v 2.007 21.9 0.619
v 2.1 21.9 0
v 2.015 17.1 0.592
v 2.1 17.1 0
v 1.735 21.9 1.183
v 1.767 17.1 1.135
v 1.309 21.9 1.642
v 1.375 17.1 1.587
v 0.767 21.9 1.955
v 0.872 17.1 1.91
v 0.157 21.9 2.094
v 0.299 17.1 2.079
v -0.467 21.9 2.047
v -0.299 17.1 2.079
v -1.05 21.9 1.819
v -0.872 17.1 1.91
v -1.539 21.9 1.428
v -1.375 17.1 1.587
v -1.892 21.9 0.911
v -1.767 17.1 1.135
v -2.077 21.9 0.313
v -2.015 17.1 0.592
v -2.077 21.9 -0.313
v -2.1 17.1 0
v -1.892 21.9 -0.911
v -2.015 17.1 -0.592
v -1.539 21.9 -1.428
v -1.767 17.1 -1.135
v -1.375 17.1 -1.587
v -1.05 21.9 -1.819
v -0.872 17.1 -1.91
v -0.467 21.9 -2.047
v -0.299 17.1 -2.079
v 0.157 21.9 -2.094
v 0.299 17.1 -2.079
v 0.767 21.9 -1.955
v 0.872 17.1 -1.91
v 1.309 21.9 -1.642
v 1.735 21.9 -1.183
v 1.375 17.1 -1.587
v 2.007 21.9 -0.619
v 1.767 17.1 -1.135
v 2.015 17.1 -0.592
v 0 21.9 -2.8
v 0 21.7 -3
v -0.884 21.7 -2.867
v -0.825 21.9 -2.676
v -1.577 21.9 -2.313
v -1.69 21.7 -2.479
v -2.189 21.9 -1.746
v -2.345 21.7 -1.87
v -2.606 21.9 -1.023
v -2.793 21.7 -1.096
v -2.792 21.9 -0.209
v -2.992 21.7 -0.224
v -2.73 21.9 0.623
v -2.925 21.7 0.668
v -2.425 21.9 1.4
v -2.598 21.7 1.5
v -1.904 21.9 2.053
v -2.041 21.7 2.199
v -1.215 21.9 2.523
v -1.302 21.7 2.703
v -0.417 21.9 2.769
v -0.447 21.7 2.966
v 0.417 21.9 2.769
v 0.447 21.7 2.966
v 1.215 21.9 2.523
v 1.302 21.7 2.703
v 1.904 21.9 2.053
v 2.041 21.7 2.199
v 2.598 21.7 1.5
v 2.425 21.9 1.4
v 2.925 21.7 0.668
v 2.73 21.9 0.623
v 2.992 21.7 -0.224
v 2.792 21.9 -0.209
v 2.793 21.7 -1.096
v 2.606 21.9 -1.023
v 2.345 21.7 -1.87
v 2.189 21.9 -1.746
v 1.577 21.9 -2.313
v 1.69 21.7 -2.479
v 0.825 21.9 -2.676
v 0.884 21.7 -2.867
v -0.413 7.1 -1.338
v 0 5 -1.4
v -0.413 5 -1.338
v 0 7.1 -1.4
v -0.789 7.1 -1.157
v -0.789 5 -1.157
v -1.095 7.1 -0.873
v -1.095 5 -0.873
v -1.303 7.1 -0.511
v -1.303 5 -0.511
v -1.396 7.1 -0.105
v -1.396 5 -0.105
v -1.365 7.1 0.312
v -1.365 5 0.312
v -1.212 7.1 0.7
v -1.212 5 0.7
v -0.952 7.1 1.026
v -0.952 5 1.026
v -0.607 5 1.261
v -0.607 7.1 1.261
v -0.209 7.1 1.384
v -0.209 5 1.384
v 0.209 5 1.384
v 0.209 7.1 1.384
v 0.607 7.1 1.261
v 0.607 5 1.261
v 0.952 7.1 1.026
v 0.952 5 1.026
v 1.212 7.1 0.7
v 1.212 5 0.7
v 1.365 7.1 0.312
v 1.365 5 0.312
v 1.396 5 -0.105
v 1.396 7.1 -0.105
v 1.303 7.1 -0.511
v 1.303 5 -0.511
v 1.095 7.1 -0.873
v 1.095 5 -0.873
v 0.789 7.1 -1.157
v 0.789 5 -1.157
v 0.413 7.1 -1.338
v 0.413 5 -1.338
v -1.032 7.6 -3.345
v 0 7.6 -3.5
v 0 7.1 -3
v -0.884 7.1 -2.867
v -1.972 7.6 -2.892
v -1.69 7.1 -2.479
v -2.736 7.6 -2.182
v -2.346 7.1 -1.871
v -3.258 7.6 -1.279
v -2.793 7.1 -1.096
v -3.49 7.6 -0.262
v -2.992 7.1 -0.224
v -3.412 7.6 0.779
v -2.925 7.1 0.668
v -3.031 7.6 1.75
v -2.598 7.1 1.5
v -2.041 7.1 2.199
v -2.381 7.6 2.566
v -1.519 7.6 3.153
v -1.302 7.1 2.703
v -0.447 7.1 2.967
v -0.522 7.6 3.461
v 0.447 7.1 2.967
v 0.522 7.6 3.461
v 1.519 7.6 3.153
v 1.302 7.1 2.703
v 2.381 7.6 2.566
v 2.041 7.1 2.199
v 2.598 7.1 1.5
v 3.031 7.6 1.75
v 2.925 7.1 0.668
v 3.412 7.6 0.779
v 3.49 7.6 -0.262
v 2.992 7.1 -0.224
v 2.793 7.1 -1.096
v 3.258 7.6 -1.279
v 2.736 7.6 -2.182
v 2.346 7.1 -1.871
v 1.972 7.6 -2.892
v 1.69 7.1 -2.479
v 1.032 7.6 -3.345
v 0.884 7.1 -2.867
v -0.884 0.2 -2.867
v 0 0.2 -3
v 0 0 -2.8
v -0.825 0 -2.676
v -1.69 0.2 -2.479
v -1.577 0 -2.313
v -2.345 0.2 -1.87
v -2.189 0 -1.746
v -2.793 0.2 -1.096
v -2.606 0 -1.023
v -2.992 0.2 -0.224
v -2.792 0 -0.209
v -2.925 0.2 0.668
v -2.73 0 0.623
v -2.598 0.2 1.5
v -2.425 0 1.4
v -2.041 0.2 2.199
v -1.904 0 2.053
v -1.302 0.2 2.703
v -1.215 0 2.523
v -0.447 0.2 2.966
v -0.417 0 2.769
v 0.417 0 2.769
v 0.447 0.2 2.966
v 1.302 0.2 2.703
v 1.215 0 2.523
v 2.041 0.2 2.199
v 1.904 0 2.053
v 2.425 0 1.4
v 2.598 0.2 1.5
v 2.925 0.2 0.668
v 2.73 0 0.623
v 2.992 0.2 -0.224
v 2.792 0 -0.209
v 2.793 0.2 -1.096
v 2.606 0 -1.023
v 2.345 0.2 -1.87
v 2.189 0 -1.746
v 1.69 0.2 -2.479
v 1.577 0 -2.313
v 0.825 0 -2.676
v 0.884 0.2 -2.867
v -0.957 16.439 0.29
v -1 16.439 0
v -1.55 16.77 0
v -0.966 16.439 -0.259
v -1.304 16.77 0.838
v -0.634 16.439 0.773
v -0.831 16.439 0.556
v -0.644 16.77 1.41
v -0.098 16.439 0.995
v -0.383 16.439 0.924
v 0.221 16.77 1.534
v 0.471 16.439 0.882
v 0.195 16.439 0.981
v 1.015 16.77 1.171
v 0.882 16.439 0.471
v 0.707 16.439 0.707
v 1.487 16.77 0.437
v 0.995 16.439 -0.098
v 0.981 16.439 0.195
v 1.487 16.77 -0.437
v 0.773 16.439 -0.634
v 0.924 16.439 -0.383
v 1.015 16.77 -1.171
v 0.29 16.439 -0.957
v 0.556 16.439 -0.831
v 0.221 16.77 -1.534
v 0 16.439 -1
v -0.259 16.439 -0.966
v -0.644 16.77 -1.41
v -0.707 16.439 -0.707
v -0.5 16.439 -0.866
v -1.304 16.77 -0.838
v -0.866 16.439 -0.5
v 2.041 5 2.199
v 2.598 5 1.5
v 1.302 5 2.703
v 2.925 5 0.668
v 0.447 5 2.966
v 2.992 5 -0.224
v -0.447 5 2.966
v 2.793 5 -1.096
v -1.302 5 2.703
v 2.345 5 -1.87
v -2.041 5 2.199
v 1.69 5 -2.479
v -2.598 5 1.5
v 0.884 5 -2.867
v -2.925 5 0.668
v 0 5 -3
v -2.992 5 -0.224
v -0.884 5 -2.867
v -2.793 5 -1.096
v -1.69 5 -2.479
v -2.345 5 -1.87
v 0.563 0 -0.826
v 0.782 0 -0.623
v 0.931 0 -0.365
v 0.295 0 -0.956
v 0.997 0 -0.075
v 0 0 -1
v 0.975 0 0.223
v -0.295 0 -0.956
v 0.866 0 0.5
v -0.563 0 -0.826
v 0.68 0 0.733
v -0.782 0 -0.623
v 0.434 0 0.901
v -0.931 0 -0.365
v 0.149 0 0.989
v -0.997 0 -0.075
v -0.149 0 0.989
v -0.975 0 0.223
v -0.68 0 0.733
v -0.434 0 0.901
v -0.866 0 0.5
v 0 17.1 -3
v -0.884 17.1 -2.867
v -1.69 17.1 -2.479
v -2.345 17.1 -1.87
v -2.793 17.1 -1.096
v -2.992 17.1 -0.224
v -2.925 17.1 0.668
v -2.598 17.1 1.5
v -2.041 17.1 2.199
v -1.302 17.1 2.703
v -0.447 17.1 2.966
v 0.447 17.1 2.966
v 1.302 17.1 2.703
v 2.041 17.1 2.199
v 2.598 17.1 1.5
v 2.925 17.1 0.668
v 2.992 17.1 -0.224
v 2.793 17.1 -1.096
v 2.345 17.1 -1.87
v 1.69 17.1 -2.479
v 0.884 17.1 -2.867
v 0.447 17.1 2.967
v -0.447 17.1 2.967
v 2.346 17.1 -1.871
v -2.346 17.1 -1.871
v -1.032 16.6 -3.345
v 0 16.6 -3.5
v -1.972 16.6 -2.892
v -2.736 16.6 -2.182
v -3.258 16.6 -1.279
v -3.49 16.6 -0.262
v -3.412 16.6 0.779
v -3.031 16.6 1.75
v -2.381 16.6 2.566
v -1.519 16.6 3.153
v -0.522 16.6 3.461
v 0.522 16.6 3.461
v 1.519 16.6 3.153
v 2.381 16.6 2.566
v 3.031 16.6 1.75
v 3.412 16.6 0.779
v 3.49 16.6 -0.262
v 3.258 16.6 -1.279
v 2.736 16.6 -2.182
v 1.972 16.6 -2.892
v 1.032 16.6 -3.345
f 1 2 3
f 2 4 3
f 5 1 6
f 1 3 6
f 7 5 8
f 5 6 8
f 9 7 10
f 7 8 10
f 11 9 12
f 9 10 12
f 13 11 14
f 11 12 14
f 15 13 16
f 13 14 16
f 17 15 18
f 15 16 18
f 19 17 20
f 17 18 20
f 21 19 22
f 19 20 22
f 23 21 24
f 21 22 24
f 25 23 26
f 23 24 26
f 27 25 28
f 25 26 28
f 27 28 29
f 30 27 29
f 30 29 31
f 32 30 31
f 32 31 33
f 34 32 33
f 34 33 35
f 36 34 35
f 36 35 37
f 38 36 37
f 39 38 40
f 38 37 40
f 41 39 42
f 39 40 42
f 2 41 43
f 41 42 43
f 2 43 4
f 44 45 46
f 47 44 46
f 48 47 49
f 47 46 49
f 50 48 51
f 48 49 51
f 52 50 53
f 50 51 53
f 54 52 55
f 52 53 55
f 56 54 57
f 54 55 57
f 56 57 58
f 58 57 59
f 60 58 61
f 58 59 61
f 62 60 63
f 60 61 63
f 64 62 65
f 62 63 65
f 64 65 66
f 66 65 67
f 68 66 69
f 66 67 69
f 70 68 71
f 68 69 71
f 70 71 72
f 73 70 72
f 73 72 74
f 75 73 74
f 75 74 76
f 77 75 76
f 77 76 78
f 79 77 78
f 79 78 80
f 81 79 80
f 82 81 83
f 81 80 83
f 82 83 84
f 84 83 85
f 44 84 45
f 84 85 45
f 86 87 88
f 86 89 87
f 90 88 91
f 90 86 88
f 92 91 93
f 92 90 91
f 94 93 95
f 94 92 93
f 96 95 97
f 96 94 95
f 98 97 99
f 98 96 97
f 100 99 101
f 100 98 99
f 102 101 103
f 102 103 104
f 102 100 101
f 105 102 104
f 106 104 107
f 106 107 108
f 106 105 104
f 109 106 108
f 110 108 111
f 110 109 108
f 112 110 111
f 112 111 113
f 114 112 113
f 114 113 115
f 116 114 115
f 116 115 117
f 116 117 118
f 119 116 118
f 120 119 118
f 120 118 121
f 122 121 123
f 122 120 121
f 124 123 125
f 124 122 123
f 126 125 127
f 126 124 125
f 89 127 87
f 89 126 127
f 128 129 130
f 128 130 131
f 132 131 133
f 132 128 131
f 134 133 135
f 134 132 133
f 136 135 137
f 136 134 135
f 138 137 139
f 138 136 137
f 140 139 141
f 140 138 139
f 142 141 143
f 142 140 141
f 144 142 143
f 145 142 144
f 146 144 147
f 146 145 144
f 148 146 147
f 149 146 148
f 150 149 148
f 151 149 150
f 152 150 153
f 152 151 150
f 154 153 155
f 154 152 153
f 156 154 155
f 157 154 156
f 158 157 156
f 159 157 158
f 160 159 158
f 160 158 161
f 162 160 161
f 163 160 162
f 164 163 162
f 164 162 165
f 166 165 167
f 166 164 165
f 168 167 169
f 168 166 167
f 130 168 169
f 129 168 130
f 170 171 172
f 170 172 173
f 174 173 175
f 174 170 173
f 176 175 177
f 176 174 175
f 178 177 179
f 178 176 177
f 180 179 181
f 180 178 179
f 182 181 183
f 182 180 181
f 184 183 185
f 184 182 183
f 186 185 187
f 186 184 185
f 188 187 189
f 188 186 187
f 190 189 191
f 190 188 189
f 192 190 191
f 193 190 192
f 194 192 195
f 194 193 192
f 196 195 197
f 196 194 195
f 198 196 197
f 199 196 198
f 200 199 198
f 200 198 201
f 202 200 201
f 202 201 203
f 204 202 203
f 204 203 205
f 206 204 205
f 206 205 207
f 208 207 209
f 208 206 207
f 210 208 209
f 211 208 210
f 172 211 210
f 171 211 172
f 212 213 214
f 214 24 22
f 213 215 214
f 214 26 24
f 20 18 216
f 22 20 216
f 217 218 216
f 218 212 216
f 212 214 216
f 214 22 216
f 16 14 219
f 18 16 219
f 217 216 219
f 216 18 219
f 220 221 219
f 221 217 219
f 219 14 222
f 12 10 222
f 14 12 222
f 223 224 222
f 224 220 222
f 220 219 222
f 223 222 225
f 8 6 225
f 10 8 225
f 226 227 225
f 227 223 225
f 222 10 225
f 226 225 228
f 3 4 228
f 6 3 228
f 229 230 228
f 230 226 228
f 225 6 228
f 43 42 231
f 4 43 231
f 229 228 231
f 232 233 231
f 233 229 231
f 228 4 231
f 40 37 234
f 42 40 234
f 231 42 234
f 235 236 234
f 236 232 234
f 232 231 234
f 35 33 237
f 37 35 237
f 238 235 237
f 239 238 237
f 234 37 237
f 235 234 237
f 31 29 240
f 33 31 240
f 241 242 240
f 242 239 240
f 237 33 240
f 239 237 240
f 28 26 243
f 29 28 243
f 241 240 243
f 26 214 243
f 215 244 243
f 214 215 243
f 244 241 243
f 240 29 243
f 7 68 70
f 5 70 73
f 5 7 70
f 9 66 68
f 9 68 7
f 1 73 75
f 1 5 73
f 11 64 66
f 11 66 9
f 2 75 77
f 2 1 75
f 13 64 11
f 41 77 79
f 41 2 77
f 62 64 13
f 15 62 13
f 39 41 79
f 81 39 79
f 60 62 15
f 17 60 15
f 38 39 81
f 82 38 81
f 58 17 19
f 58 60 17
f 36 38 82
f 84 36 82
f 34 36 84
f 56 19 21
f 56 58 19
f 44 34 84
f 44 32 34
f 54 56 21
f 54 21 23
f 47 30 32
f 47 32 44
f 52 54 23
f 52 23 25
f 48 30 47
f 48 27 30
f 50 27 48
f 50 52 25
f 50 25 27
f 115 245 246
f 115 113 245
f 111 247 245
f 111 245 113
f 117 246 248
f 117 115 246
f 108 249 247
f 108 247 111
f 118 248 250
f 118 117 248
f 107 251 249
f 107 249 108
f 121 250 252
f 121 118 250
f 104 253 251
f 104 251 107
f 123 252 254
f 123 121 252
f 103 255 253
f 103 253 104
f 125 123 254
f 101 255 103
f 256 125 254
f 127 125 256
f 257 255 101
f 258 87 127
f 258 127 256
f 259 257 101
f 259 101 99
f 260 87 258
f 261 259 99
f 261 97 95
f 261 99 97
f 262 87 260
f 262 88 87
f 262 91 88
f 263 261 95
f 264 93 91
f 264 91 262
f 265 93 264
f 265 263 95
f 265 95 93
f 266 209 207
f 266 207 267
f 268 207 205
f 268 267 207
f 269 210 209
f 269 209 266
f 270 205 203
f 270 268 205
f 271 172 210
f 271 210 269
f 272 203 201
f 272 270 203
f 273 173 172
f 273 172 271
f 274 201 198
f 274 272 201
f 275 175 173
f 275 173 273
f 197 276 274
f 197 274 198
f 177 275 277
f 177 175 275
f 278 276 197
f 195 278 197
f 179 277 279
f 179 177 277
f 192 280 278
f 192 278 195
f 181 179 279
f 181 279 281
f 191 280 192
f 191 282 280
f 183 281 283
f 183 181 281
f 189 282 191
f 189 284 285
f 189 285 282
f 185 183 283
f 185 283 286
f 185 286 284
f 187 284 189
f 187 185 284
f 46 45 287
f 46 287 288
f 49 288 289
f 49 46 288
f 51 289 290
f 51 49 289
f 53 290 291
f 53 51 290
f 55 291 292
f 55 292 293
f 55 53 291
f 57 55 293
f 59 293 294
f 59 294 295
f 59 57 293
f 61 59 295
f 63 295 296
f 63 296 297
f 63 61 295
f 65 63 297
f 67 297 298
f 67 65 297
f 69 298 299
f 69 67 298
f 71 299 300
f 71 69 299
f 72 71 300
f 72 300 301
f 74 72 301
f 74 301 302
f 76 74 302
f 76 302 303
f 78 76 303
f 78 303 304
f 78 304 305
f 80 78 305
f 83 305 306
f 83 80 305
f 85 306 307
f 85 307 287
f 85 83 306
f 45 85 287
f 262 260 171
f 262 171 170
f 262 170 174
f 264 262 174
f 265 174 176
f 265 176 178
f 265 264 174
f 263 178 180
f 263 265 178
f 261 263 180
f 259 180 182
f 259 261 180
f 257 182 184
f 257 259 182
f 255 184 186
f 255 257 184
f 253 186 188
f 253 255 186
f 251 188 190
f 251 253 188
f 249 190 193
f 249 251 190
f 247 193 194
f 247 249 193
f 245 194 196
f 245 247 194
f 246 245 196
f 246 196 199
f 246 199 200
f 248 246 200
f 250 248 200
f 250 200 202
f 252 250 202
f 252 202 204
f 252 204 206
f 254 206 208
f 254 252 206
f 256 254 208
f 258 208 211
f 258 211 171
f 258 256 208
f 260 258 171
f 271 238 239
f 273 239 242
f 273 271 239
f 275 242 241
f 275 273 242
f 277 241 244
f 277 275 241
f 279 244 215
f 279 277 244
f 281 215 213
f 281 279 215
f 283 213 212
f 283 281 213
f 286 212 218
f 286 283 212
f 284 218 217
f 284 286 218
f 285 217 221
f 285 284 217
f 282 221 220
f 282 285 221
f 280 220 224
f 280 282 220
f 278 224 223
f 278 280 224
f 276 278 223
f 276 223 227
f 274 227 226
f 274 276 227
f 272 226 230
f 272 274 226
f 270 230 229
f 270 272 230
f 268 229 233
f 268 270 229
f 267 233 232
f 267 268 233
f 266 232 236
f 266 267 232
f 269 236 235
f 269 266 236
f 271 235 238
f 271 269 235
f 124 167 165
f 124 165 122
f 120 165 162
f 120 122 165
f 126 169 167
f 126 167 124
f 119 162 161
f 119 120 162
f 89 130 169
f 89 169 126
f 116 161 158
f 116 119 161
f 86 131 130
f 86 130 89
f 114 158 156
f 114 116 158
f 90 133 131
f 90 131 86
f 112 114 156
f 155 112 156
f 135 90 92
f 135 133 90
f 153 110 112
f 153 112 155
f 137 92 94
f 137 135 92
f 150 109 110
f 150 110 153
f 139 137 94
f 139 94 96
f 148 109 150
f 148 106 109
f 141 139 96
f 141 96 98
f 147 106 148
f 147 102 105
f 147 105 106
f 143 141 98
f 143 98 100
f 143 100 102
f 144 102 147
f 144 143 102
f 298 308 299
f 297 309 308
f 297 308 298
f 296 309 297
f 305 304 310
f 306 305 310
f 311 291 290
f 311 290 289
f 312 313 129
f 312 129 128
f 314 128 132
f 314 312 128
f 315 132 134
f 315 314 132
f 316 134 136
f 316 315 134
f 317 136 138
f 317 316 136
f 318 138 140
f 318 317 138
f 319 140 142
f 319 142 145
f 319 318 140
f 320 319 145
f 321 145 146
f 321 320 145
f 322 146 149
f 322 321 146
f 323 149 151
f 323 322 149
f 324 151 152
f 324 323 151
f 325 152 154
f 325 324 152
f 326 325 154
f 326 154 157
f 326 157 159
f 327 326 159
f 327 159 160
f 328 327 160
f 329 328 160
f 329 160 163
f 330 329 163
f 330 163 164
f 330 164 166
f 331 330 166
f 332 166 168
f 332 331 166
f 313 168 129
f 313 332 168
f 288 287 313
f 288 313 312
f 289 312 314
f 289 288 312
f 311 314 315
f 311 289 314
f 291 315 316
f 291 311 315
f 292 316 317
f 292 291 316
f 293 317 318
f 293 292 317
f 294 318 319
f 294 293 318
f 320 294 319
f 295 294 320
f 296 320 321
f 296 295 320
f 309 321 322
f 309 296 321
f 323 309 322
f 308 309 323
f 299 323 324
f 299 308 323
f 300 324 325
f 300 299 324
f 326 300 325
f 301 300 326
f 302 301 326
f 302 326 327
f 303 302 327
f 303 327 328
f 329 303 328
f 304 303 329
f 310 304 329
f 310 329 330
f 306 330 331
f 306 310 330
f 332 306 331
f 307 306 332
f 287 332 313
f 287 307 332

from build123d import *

# Parameters (mm, degrees)
HOLE_WIZARD_1_D     = 4.2
HOLE_WIZARD_1_DEPTH = 4.8
HOLE_WIZARD_1_TIP   = 1.2618073
CHAMFER_1_SIZE      = 0.2
CHAMFER_2_SIZE      = 0.5


with BuildPart() as part:
    # Эскиз1 → Повернуть1 (revolve)
    with BuildSketch(Plane(origin=(0, 0, 0), x_dir=(0, 0, -1), z_dir=(1, 0, 0)), mode=Mode.PRIVATE) as revolve_1_sk:
        Polygon((-1, 21.9), (-1, 0), (-3, 0), (-3, 5), (-1.4, 5), (-1.4, 7.1), (-3.5, 7.1), (-3.5, 17.1), (-3, 17.1), (-3, 21.9), align=None)
    revolve(revolve_1_sk.sketch.rotate(Axis((0, 0, 0), (0, 1, 0)), 180), axis=Axis((0, 0, 0), (0, 1, 0)))

    # Отверстие1
    with Locations(Plane(origin=(0, 21.9, 0), x_dir=(-1, 0, 0), z_dir=(0, 1, 0))):
        with Locations((0, 0)):
            Hole(HOLE_WIZARD_1_D / 2, depth=HOLE_WIZARD_1_DEPTH)
            with Locations((0, 0, -(HOLE_WIZARD_1_DEPTH + HOLE_WIZARD_1_TIP / 2))):  # 118° drill point
                Cone(0, HOLE_WIZARD_1_D / 2, HOLE_WIZARD_1_TIP, mode=Mode.SUBTRACT)

    # Фаска1
    chamfer_1_edges = [part.edges().sort_by_distance(p)[0] for p in [
        (0, 0, 3),
        (0, 21.9, 3),
    ]]
    chamfer(chamfer_1_edges, length=CHAMFER_1_SIZE)

    # Фаска2
    chamfer_2_edges = [part.edges().sort_by_distance(p)[0] for p in [
        (0, 17.1, 3.5),
        (0, 7.1, 3.5),
    ]]
    chamfer(chamfer_2_edges, length=CHAMFER_2_SIZE - 0.0001)  # a hair under: the kernel refuses the full size


solid = part.part
